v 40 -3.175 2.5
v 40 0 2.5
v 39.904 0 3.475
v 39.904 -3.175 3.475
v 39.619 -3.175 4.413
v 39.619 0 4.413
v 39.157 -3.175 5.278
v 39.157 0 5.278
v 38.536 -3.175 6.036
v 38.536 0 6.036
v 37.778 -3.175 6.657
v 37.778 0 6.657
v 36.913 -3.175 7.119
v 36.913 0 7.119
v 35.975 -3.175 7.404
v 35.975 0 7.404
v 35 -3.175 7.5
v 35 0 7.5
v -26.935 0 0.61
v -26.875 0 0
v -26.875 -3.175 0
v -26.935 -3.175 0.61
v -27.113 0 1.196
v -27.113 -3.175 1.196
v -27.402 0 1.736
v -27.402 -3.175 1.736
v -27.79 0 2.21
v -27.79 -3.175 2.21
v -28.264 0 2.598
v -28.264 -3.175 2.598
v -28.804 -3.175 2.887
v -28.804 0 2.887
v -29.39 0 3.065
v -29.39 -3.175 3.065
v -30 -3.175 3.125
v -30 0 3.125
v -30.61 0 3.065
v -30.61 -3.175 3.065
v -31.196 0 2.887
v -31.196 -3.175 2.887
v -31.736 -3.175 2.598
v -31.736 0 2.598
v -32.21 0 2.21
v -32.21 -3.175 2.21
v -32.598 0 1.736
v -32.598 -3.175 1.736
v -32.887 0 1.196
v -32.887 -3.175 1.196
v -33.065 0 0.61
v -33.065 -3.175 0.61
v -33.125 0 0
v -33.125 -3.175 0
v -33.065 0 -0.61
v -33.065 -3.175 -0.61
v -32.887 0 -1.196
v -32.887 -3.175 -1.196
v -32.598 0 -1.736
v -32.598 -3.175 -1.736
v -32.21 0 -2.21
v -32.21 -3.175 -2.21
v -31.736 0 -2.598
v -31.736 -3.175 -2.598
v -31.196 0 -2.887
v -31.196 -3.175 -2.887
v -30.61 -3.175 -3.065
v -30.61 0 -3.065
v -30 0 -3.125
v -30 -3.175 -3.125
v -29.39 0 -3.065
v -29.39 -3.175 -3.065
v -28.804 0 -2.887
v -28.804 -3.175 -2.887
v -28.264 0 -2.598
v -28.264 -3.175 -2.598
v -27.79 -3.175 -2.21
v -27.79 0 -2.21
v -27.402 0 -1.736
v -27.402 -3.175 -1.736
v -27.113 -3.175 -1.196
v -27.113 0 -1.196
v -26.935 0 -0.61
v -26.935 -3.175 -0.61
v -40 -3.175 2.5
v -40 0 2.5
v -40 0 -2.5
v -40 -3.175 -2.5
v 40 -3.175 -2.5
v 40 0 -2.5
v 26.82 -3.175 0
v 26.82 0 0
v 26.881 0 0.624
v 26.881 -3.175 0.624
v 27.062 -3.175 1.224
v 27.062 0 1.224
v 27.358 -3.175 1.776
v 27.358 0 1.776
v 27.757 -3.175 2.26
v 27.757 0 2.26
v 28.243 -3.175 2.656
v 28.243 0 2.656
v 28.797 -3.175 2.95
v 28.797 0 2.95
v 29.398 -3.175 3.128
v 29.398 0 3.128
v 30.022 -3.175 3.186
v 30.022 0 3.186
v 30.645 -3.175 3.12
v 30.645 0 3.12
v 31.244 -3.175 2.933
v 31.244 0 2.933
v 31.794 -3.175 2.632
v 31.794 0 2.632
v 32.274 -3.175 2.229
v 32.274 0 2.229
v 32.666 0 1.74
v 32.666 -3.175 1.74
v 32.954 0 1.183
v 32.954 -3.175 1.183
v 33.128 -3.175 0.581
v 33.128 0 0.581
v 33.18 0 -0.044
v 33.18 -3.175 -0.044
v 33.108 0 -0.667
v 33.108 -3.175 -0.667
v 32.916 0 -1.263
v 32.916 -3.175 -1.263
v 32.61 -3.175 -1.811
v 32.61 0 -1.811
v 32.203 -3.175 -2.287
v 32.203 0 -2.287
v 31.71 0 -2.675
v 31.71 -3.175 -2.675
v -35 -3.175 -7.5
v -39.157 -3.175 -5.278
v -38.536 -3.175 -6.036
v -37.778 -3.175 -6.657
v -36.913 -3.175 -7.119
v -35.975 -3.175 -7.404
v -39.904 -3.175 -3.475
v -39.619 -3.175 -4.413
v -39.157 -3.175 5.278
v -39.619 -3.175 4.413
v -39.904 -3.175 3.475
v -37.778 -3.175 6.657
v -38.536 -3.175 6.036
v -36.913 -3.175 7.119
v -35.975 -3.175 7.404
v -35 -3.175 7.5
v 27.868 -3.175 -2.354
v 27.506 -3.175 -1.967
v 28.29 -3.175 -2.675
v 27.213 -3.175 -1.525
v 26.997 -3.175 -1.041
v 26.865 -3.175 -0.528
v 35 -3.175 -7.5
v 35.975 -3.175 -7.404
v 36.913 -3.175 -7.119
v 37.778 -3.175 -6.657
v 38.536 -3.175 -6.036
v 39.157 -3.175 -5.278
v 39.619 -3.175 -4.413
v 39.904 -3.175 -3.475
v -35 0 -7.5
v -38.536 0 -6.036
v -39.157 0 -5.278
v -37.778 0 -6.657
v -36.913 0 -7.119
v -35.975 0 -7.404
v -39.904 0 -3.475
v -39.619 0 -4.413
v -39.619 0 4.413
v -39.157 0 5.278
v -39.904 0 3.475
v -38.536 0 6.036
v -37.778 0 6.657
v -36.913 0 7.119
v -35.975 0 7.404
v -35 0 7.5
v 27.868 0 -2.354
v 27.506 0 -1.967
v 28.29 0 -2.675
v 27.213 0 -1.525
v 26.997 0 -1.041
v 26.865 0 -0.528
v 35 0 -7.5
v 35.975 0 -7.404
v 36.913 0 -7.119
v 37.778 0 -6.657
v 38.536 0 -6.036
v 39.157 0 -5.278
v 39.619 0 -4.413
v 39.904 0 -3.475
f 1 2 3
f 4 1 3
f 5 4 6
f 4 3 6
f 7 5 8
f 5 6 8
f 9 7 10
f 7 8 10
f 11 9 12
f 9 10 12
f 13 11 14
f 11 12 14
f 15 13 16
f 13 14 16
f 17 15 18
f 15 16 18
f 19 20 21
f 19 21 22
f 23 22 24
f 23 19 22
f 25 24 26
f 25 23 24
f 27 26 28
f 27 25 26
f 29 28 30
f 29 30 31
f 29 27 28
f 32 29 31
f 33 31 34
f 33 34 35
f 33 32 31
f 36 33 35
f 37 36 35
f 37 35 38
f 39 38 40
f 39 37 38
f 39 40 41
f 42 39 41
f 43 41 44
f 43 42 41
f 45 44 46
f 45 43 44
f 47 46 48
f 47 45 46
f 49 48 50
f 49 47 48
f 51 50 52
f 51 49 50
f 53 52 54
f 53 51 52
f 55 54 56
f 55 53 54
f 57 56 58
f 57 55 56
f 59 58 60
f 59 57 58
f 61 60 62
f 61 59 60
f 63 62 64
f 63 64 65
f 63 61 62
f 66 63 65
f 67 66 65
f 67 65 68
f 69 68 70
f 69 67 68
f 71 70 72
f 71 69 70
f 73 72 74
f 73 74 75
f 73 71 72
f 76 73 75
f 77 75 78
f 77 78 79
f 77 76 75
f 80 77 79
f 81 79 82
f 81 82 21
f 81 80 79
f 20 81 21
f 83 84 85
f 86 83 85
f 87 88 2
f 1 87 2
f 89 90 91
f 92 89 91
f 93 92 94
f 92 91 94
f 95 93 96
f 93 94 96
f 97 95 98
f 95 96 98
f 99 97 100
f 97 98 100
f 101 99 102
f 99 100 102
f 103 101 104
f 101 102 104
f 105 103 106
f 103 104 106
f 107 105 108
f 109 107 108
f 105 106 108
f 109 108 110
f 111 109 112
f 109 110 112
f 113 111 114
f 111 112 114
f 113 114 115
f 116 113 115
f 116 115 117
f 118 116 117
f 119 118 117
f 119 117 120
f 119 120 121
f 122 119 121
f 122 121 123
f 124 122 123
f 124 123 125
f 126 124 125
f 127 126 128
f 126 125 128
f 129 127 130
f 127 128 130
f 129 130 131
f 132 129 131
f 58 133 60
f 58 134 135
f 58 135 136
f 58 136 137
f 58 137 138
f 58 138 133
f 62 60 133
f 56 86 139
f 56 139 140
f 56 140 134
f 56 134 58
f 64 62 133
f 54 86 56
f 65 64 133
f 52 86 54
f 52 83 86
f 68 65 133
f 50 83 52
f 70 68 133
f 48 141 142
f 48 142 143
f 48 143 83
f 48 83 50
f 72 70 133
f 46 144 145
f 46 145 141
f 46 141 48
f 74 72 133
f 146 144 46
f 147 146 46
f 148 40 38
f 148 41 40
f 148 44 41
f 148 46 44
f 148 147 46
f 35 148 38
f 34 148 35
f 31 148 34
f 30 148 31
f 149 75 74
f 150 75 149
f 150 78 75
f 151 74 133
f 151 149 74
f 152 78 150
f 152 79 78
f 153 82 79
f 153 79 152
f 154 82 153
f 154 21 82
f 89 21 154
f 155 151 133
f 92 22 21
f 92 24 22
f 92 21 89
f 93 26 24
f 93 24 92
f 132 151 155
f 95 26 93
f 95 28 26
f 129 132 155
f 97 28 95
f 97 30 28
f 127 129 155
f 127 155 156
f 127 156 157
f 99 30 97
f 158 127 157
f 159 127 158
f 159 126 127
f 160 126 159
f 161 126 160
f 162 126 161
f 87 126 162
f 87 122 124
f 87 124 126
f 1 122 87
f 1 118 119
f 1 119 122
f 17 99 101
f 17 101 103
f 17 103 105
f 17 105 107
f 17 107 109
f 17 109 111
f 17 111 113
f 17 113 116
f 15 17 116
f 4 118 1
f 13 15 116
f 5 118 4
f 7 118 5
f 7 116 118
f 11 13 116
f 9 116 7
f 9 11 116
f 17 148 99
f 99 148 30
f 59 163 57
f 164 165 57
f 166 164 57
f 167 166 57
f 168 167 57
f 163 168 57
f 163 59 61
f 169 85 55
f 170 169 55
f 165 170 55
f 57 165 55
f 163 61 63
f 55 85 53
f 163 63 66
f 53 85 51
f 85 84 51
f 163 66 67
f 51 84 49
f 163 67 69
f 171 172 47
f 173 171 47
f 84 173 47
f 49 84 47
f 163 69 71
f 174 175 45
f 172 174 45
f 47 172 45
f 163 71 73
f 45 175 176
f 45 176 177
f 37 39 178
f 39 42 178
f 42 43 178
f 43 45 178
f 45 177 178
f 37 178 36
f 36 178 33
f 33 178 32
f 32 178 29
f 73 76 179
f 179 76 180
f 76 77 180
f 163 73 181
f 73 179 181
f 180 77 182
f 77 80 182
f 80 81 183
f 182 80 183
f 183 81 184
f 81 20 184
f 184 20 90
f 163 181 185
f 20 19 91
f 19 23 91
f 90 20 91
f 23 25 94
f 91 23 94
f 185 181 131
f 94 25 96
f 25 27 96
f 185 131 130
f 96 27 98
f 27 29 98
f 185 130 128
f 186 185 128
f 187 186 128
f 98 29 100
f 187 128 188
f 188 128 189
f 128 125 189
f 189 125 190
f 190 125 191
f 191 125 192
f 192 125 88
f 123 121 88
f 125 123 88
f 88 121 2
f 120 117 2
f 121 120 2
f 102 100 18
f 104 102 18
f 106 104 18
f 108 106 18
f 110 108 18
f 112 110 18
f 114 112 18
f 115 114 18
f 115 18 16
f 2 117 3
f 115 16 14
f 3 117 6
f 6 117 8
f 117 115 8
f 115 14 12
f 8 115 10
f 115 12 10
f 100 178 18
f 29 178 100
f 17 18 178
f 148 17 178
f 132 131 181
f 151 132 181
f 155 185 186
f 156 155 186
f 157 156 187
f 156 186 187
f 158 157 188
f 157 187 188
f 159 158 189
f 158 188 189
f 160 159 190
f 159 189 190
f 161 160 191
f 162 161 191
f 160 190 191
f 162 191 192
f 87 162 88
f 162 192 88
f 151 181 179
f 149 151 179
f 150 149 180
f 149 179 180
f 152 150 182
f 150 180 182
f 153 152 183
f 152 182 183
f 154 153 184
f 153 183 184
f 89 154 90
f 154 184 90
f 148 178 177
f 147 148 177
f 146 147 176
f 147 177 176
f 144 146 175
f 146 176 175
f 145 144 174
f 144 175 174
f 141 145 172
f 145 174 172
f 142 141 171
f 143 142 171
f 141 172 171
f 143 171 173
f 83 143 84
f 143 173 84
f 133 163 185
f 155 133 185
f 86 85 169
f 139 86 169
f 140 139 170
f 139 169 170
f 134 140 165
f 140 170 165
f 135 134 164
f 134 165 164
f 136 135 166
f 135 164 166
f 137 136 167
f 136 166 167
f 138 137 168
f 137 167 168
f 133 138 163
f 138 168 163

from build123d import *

# Parameters (mm, degrees)
F0_R     = 3.125
F1_DEPTH = 3.175


with BuildPart() as f1:
    # F0 (on Front) → F1 (new body)
    with BuildSketch(Plane.XZ):
        with BuildLine():
            ThreePointArc((40, 2.5), (38.535534, 6.035534), (35, 7.5))
            Line((35, 7.5), (-35, 7.5))
            ThreePointArc((-35, 7.5), (-38.535534, 6.035534), (-40, 2.5))
            Line((-40, 2.5), (-40, -2.5))
            ThreePointArc((-40, -2.5), (-38.535534, -6.035534), (-35, -7.5))
            Line((-35, -7.5), (35, -7.5))
            ThreePointArc((35, -7.5), (38.535534, -6.035534), (40, -2.5))
            Line((40, -2.5), (40, 2.5))
        make_face()
        with Locations((-30, 0)):
            Circle(F0_R, mode=Mode.SUBTRACT)
        with BuildLine():
            ThreePointArc((28.289735, -2.674999), (27.212965, -1.525353), (26.820006, 0))
            ThreePointArc((26.820006, 0), (31.526083, 2.79582), (31.710265, -2.674999))
            Line((31.710265, -2.674999), (28.289735, -2.674999))
        make_face(mode=Mode.SUBTRACT)
    extrude(amount=F1_DEPTH)


solid = f1.part
